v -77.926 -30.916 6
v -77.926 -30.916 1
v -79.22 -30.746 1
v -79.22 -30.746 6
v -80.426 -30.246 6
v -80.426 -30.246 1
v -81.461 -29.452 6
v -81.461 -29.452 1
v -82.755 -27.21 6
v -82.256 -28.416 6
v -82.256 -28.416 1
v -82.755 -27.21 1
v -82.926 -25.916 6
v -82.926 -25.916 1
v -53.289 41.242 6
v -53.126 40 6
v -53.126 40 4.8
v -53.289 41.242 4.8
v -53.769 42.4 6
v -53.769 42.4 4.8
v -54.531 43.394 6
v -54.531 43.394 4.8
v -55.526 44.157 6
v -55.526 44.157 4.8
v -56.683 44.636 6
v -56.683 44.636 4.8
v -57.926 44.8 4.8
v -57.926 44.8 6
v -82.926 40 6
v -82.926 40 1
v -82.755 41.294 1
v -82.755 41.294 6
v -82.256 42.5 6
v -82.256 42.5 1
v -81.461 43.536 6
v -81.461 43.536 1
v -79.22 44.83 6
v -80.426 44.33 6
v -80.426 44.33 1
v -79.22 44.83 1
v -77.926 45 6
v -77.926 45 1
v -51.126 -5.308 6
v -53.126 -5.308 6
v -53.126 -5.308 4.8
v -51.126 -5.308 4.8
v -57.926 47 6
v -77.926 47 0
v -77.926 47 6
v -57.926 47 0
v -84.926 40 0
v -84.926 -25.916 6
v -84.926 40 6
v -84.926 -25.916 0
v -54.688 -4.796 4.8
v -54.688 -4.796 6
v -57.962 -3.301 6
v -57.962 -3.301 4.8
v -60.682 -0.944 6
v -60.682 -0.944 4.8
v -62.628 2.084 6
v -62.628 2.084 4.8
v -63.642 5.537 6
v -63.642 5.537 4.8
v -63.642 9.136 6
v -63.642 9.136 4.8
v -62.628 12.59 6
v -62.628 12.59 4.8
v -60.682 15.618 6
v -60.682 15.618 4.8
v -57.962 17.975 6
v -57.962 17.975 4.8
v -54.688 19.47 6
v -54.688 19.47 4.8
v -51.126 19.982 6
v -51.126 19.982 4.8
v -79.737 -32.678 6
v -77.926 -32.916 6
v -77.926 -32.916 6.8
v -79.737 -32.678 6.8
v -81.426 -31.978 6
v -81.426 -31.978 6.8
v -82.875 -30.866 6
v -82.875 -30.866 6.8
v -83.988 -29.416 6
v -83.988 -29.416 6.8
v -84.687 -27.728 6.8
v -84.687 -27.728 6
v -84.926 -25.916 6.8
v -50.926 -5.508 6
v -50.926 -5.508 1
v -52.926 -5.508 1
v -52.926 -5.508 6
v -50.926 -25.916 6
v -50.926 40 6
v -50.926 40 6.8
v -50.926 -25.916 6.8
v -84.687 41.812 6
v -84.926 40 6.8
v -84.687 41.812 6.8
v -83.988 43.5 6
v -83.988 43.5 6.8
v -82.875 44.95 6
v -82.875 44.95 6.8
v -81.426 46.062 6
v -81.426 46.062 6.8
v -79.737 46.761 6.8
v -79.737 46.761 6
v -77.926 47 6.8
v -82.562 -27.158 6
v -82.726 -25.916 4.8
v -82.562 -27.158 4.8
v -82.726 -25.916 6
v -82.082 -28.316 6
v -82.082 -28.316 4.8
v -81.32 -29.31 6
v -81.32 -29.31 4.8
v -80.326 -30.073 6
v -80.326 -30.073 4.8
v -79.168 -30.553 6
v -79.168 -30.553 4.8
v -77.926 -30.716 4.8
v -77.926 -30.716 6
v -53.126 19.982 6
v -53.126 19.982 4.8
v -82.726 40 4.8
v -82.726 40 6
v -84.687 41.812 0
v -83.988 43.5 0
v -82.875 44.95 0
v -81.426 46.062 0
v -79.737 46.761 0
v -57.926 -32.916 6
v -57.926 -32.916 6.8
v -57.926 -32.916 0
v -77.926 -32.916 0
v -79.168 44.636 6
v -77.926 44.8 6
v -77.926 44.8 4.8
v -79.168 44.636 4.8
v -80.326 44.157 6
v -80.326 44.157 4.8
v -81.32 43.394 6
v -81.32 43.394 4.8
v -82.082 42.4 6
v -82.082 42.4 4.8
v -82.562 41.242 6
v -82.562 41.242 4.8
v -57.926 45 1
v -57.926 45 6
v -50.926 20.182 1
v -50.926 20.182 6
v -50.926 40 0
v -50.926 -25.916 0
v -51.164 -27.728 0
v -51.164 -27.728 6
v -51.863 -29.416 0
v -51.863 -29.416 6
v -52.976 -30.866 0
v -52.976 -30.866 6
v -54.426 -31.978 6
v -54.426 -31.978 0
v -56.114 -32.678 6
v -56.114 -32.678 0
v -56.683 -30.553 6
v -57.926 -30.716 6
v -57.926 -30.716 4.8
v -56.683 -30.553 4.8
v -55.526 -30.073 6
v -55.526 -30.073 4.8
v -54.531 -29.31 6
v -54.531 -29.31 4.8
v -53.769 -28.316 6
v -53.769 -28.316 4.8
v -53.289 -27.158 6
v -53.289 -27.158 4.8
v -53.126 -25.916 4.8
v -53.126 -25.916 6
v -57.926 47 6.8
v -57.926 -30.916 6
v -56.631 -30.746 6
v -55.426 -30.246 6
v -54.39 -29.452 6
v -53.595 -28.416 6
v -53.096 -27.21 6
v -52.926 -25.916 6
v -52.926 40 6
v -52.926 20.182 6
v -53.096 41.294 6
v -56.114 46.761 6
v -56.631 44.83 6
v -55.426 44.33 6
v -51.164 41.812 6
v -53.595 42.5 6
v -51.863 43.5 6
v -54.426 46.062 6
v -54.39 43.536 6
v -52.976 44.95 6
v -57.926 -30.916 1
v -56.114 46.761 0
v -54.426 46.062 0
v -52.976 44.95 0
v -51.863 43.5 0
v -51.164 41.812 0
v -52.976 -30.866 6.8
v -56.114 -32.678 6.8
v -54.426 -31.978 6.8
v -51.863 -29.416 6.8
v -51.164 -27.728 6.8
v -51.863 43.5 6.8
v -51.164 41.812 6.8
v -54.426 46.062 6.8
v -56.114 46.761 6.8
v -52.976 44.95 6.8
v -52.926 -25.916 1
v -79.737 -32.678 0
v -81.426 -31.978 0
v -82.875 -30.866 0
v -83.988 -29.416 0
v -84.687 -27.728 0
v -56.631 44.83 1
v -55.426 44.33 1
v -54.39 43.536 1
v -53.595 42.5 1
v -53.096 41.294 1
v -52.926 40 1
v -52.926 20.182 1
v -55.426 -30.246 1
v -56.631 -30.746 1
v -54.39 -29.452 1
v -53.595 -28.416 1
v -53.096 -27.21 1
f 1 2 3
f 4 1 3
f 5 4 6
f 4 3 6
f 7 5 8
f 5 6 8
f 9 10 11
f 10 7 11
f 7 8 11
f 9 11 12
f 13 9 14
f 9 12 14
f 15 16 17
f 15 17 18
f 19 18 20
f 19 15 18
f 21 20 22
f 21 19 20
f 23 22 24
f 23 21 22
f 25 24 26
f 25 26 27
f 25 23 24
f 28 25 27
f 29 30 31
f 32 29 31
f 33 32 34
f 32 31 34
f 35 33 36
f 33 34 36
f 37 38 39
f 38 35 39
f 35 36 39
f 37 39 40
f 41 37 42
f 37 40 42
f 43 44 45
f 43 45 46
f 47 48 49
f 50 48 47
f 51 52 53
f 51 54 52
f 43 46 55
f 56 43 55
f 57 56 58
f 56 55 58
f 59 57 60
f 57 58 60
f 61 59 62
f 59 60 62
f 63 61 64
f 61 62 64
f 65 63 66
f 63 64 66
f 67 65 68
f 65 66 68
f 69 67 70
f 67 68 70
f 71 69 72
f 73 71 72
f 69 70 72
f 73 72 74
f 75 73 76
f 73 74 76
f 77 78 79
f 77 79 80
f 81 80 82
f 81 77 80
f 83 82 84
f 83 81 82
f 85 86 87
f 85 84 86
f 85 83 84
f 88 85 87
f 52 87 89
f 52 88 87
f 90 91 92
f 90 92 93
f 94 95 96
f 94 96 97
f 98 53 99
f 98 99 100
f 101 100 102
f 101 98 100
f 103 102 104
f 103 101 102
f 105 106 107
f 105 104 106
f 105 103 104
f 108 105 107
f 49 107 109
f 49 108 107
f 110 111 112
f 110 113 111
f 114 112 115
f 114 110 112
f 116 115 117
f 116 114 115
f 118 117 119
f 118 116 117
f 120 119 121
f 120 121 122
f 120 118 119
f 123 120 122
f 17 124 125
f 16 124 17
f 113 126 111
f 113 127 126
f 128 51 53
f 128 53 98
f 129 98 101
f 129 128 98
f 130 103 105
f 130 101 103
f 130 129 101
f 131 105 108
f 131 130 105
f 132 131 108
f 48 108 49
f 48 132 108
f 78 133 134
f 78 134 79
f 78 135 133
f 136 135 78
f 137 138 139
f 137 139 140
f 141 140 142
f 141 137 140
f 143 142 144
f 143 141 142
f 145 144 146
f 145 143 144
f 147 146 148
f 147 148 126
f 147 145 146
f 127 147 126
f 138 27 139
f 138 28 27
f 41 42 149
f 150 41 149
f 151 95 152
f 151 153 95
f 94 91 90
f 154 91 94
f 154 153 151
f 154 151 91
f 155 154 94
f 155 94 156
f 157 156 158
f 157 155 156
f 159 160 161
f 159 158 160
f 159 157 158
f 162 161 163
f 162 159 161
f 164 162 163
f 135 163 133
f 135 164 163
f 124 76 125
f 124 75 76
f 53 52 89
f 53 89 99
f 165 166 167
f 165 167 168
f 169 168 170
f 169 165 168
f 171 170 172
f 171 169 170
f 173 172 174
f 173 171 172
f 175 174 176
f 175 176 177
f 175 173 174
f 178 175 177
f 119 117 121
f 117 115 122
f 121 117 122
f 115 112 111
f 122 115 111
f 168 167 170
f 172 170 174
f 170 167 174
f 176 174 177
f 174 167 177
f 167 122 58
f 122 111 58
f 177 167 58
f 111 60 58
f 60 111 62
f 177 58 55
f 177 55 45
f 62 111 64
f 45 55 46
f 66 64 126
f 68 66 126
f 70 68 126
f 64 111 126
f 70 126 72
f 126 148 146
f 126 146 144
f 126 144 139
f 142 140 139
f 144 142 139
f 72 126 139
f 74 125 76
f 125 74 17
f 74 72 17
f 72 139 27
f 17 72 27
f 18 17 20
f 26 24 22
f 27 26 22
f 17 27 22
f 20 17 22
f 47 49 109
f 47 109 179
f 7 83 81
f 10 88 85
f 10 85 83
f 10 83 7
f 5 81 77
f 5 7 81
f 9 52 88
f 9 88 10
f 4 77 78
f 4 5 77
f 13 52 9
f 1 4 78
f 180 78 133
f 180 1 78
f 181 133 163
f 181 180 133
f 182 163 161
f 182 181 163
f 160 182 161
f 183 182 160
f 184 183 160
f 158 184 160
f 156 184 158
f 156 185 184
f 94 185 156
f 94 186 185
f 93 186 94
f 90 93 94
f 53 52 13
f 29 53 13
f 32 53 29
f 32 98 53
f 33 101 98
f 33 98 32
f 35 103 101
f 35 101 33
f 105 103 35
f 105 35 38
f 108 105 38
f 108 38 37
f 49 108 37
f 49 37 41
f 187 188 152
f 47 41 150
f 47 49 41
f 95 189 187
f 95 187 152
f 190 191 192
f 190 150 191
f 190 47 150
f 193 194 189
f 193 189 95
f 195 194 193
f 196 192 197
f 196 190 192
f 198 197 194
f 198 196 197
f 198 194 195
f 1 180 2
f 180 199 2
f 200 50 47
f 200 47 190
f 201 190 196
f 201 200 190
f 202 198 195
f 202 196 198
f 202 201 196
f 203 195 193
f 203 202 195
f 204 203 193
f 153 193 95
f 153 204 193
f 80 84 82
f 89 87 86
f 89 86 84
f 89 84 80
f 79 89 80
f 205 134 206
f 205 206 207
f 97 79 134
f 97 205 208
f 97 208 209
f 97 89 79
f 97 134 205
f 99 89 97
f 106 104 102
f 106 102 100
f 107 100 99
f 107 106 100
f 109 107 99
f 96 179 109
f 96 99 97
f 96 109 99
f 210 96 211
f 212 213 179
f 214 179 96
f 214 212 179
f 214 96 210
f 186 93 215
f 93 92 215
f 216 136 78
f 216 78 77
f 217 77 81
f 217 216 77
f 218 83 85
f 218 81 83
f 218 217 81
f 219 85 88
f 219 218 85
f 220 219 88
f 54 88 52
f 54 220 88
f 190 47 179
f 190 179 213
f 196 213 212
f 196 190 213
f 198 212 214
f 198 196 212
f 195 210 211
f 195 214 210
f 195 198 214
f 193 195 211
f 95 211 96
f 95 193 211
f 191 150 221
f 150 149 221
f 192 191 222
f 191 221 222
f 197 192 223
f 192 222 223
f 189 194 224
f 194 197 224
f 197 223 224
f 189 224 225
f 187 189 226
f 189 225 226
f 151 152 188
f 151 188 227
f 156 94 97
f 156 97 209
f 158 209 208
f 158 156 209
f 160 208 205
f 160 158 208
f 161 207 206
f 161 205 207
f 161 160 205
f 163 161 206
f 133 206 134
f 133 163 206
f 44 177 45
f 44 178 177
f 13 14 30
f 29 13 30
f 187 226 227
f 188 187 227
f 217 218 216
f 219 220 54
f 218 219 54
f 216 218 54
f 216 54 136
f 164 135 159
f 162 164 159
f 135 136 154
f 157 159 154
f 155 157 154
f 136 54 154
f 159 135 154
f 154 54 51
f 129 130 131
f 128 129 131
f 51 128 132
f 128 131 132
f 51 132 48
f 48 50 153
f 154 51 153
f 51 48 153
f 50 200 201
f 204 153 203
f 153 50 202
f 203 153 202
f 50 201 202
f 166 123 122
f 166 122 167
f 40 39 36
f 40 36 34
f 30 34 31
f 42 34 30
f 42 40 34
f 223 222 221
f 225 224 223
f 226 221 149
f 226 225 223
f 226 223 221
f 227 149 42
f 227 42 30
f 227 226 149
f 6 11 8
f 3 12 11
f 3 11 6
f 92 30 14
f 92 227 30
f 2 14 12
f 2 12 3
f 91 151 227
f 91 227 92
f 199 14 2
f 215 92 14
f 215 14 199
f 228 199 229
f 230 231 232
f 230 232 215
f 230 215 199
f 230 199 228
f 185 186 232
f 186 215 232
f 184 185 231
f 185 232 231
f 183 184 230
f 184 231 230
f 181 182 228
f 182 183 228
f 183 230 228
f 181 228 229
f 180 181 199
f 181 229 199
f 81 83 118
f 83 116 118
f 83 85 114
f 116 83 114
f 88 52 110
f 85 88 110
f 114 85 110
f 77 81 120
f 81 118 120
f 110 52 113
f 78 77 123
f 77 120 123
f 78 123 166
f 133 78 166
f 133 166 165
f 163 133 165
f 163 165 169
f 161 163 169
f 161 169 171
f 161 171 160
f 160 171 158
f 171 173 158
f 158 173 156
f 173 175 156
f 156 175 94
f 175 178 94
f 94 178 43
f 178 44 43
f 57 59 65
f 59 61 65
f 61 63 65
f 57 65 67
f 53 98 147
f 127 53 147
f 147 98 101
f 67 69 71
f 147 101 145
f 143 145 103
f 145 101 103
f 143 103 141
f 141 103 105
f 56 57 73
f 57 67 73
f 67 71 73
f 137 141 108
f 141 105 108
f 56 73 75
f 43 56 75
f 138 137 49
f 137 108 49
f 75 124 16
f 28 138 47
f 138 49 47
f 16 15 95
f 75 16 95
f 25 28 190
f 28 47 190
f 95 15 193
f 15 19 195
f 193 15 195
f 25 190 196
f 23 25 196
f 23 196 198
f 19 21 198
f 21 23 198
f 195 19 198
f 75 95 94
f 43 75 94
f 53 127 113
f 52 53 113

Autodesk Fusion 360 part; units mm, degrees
sketch "Sketch1" plane through (0, 0, 0) normal (0, 0, 1) x (1, 0, 0)
  circle A0 centre (6.1655, 9.1526) radius 11.625
  dimension "d1" = 23.25
sketch "Sketch2" plane through (0, 0, 0) normal (0, 0, 1) x (1, 0, 0)
  line L0 (-57.9255, -30.9161) -> (-77.9255, -30.9161)
  line L1 (-82.9255, -25.9161) -> (-82.9255, 40)
  line L2 (-77.9255, 45) -> (-57.9255, 45)
  line L3 (-52.9255, 40) -> (-52.9255, -25.9161)
  arc A0 (-77.9255, 45) -> (-82.9255, 40) centre (-77.9255, 40) ccw
  arc A1 (-52.9255, 40) -> (-57.9255, 45) centre (-57.9255, 40) ccw
  arc A2 (-82.9255, -25.9161) -> (-77.9255, -30.9161) centre (-77.9255, -25.9161) ccw
  arc A3 (-57.9255, -30.9161) -> (-52.9255, -25.9161) centre (-57.9255, -25.9161) ccw
  arc A4 (-77.9255, 47) -> (-84.9255, 40) centre (-77.9255, 40) ccw
  line L4 (-84.9255, -25.9161) -> (-84.9255, 40)
  arc A5 (-84.9255, -25.9161) -> (-77.9255, -32.9161) centre (-77.9255, -25.9161) ccw
  line L5 (-57.9255, -32.9161) -> (-77.9255, -32.9161)
  arc A6 (-57.9255, -32.9161) -> (-50.9255, -25.9161) centre (-57.9255, -25.9161) ccw
  line L6 (-50.9255, 40) -> (-50.9255, -25.9161)
  arc A7 (-50.9255, 40) -> (-57.9255, 47) centre (-57.9255, 40) ccw
  line L7 (-77.9255, 47) -> (-57.9255, 47)
  dimension "d2" = 5
  dimension "d3" = 5
  dimension "d4" = 5
  dimension "d5" = -2
  dimension "d17" = 30
extrude "Extrude2" add sketch "Sketch2" along normal blind 1 contours L0 L1 L2 L3 A0 A1 A2 A3 makes body 1
extrude "Extrude3" add sketch "Sketch2" along normal blind 6 bodies 1
sketch "Sketch3" plane through (0, 0, 0) normal (0, 0, 1) x (1, 0, 0)
sketch "Sketch4" plane through (-50.9255, 0, 0) normal (1, 0, 0) x (0, 1, 0)
  line L0 (-25.9161, 0) -> (40, 0)
  line L1 (40, 0) -> (40, 6)
  line L2 (40, 6) -> (-25.9161, 6)
  line L3 (-25.9161, 6) -> (-25.9161, 0)
  line L4 (-5.5081, 6) -> (20.1819, 6)
  line L5 (20.1819, 6) -> (20.1819, 1)
  line L6 (20.1819, 1) -> (-5.5081, 1)
  line L7 (-5.5081, 1) -> (-5.5081, 6)
  dimension "d12" = 25.69
  dimension "d13" = 5
  dimension "d14" = 20.408
extrude "Extrude4" cut sketch "Sketch4" against normal blind 2 contours L2 L4 L5 L6 L7 bodies 1
ref_plane "WorkPlane1" through (-67.9255, 7.0419, 6) normal (0, 0, 1) x (1, 0, 0)
sketch "Sketch14" plane through (0, 0, 6) normal (0, 0, 1) x (1, 0, 0)
  line L0 (-84.9255, -25.9161) -> (-84.9255, 40)
  arc A0 (-77.9255, 47) -> (-84.9255, 40) centre (-77.9255, 40) ccw
  line L1 (-77.9255, 47) -> (-57.9255, 47)
  arc A1 (-50.9255, 40) -> (-57.9255, 47) centre (-57.9255, 40) ccw
  line L2 (-50.9255, 40) -> (-50.9255, -25.9161)
  arc A2 (-57.9255, -32.9161) -> (-50.9255, -25.9161) centre (-57.9255, -25.9161) ccw
  line L3 (-57.9255, -32.9161) -> (-77.9255, -32.9161)
  arc A3 (-84.9255, -25.9161) -> (-77.9255, -32.9161) centre (-77.9255, -25.9161) ccw
extrude "Extrude5" add sketch "Sketch14" along normal blind 0.8 separate body makes body 2
sketch "Sketch15" plane through (0, 0, 6) normal (0, 0, 1) x (1, 0, 0)
  arc A0 (-82.9255, -25.9161) -> (-77.9255, -30.9161) centre (-77.9255, -25.9161) ccw
  line L0 (-77.9255, -30.9161) -> (-57.9255, -30.9161)
  arc A1 (-57.9255, -30.9161) -> (-52.9255, -25.9161) centre (-57.9255, -25.9161) ccw
  line L1 (-52.9255, -25.9161) -> (-52.9255, -5.5081)
  line L2 (-52.9255, -5.5081) -> (-50.9255, -5.5081)
  line L3 (-50.9255, -5.5081) -> (-50.9255, 20.1819)
  line L4 (-50.9255, 20.1819) -> (-52.9255, 20.1819)
  line L5 (-52.9255, 20.1819) -> (-52.9255, 40)
  arc A2 (-52.9255, 40) -> (-57.9255, 45) centre (-57.9255, 40) ccw
  line L6 (-57.9255, 45) -> (-77.9255, 45)
  arc A3 (-77.9255, 45) -> (-82.9255, 40) centre (-77.9255, 40) ccw
  line L7 (-82.9255, 40) -> (-82.9255, -25.9161)
  line L8 (-51.1255, -5.3081) -> (-51.1255, 19.9819)
  line L9 (-51.1255, 19.9819) -> (-53.1255, 19.9819)
  line L10 (-53.1255, 19.9819) -> (-53.1255, 40)
  arc A4 (-53.1255, 40) -> (-57.9255, 44.8) centre (-57.9255, 40) ccw
  line L11 (-57.9255, 44.8) -> (-77.9255, 44.8)
  arc A5 (-77.9255, 44.8) -> (-82.7255, 40) centre (-77.9255, 40) ccw
  line L12 (-82.7255, 40) -> (-82.7255, -25.9161)
  arc A6 (-82.7255, -25.9161) -> (-77.9255, -30.7161) centre (-77.9255, -25.9161) ccw
  line L13 (-77.9255, -30.7161) -> (-57.9255, -30.7161)
  arc A7 (-57.9255, -30.7161) -> (-53.1255, -25.9161) centre (-57.9255, -25.9161) ccw
  line L14 (-53.1255, -25.9161) -> (-53.1255, -5.3081)
  line L15 (-53.1255, -5.3081) -> (-51.1255, -5.3081)
  dimension "d25" = -0.2
extrude "Extrude8" add sketch "Sketch15" against normal blind 1.2 contours L8 L9 L10 A4 L11 A5 L12 A6 L13 A7 L14 L15 bodies 2
sketch "Sketch17" plane through (0, 0, 4.8) normal (0, 0, -1) x (1, 0, 0)
  line L0 (-51.1255, 5.3081) -> (-53.1255, 5.3081)
  line L1 (-53.1255, 5.3081) -> (-53.1255, 25.9161)
  arc A0 (-53.1255, 25.9161) -> (-57.9255, 30.7161) centre (-57.9255, 25.9161) ccw
  line L2 (-57.9255, 30.7161) -> (-77.9255, 30.7161)
  arc A1 (-77.9255, 30.7161) -> (-82.7255, 25.9161) centre (-77.9255, 25.9161) ccw
  line L3 (-82.7255, 25.9161) -> (-82.7255, -40)
  arc A2 (-82.7255, -40) -> (-77.9255, -44.8) centre (-77.9255, -40) ccw
  line L4 (-77.9255, -44.8) -> (-57.9255, -44.8)
  arc A3 (-57.9255, -44.8) -> (-53.1255, -40) centre (-57.9255, -40) ccw
  line L5 (-53.1255, -40) -> (-53.1255, -19.9819)
  line L6 (-53.1255, -19.9819) -> (-51.1255, -19.9819)
  line L7 (-51.1255, -19.9819) -> (-51.1255, 5.3081)
  circle A4 centre (-51.1255, -7.3369) radius 12.645
extrude "Extrude9" cut sketch "Sketch17" against normal blind 1.2 contours L7 A4 picked at (-52.9961, -11.4117) bodies 2
